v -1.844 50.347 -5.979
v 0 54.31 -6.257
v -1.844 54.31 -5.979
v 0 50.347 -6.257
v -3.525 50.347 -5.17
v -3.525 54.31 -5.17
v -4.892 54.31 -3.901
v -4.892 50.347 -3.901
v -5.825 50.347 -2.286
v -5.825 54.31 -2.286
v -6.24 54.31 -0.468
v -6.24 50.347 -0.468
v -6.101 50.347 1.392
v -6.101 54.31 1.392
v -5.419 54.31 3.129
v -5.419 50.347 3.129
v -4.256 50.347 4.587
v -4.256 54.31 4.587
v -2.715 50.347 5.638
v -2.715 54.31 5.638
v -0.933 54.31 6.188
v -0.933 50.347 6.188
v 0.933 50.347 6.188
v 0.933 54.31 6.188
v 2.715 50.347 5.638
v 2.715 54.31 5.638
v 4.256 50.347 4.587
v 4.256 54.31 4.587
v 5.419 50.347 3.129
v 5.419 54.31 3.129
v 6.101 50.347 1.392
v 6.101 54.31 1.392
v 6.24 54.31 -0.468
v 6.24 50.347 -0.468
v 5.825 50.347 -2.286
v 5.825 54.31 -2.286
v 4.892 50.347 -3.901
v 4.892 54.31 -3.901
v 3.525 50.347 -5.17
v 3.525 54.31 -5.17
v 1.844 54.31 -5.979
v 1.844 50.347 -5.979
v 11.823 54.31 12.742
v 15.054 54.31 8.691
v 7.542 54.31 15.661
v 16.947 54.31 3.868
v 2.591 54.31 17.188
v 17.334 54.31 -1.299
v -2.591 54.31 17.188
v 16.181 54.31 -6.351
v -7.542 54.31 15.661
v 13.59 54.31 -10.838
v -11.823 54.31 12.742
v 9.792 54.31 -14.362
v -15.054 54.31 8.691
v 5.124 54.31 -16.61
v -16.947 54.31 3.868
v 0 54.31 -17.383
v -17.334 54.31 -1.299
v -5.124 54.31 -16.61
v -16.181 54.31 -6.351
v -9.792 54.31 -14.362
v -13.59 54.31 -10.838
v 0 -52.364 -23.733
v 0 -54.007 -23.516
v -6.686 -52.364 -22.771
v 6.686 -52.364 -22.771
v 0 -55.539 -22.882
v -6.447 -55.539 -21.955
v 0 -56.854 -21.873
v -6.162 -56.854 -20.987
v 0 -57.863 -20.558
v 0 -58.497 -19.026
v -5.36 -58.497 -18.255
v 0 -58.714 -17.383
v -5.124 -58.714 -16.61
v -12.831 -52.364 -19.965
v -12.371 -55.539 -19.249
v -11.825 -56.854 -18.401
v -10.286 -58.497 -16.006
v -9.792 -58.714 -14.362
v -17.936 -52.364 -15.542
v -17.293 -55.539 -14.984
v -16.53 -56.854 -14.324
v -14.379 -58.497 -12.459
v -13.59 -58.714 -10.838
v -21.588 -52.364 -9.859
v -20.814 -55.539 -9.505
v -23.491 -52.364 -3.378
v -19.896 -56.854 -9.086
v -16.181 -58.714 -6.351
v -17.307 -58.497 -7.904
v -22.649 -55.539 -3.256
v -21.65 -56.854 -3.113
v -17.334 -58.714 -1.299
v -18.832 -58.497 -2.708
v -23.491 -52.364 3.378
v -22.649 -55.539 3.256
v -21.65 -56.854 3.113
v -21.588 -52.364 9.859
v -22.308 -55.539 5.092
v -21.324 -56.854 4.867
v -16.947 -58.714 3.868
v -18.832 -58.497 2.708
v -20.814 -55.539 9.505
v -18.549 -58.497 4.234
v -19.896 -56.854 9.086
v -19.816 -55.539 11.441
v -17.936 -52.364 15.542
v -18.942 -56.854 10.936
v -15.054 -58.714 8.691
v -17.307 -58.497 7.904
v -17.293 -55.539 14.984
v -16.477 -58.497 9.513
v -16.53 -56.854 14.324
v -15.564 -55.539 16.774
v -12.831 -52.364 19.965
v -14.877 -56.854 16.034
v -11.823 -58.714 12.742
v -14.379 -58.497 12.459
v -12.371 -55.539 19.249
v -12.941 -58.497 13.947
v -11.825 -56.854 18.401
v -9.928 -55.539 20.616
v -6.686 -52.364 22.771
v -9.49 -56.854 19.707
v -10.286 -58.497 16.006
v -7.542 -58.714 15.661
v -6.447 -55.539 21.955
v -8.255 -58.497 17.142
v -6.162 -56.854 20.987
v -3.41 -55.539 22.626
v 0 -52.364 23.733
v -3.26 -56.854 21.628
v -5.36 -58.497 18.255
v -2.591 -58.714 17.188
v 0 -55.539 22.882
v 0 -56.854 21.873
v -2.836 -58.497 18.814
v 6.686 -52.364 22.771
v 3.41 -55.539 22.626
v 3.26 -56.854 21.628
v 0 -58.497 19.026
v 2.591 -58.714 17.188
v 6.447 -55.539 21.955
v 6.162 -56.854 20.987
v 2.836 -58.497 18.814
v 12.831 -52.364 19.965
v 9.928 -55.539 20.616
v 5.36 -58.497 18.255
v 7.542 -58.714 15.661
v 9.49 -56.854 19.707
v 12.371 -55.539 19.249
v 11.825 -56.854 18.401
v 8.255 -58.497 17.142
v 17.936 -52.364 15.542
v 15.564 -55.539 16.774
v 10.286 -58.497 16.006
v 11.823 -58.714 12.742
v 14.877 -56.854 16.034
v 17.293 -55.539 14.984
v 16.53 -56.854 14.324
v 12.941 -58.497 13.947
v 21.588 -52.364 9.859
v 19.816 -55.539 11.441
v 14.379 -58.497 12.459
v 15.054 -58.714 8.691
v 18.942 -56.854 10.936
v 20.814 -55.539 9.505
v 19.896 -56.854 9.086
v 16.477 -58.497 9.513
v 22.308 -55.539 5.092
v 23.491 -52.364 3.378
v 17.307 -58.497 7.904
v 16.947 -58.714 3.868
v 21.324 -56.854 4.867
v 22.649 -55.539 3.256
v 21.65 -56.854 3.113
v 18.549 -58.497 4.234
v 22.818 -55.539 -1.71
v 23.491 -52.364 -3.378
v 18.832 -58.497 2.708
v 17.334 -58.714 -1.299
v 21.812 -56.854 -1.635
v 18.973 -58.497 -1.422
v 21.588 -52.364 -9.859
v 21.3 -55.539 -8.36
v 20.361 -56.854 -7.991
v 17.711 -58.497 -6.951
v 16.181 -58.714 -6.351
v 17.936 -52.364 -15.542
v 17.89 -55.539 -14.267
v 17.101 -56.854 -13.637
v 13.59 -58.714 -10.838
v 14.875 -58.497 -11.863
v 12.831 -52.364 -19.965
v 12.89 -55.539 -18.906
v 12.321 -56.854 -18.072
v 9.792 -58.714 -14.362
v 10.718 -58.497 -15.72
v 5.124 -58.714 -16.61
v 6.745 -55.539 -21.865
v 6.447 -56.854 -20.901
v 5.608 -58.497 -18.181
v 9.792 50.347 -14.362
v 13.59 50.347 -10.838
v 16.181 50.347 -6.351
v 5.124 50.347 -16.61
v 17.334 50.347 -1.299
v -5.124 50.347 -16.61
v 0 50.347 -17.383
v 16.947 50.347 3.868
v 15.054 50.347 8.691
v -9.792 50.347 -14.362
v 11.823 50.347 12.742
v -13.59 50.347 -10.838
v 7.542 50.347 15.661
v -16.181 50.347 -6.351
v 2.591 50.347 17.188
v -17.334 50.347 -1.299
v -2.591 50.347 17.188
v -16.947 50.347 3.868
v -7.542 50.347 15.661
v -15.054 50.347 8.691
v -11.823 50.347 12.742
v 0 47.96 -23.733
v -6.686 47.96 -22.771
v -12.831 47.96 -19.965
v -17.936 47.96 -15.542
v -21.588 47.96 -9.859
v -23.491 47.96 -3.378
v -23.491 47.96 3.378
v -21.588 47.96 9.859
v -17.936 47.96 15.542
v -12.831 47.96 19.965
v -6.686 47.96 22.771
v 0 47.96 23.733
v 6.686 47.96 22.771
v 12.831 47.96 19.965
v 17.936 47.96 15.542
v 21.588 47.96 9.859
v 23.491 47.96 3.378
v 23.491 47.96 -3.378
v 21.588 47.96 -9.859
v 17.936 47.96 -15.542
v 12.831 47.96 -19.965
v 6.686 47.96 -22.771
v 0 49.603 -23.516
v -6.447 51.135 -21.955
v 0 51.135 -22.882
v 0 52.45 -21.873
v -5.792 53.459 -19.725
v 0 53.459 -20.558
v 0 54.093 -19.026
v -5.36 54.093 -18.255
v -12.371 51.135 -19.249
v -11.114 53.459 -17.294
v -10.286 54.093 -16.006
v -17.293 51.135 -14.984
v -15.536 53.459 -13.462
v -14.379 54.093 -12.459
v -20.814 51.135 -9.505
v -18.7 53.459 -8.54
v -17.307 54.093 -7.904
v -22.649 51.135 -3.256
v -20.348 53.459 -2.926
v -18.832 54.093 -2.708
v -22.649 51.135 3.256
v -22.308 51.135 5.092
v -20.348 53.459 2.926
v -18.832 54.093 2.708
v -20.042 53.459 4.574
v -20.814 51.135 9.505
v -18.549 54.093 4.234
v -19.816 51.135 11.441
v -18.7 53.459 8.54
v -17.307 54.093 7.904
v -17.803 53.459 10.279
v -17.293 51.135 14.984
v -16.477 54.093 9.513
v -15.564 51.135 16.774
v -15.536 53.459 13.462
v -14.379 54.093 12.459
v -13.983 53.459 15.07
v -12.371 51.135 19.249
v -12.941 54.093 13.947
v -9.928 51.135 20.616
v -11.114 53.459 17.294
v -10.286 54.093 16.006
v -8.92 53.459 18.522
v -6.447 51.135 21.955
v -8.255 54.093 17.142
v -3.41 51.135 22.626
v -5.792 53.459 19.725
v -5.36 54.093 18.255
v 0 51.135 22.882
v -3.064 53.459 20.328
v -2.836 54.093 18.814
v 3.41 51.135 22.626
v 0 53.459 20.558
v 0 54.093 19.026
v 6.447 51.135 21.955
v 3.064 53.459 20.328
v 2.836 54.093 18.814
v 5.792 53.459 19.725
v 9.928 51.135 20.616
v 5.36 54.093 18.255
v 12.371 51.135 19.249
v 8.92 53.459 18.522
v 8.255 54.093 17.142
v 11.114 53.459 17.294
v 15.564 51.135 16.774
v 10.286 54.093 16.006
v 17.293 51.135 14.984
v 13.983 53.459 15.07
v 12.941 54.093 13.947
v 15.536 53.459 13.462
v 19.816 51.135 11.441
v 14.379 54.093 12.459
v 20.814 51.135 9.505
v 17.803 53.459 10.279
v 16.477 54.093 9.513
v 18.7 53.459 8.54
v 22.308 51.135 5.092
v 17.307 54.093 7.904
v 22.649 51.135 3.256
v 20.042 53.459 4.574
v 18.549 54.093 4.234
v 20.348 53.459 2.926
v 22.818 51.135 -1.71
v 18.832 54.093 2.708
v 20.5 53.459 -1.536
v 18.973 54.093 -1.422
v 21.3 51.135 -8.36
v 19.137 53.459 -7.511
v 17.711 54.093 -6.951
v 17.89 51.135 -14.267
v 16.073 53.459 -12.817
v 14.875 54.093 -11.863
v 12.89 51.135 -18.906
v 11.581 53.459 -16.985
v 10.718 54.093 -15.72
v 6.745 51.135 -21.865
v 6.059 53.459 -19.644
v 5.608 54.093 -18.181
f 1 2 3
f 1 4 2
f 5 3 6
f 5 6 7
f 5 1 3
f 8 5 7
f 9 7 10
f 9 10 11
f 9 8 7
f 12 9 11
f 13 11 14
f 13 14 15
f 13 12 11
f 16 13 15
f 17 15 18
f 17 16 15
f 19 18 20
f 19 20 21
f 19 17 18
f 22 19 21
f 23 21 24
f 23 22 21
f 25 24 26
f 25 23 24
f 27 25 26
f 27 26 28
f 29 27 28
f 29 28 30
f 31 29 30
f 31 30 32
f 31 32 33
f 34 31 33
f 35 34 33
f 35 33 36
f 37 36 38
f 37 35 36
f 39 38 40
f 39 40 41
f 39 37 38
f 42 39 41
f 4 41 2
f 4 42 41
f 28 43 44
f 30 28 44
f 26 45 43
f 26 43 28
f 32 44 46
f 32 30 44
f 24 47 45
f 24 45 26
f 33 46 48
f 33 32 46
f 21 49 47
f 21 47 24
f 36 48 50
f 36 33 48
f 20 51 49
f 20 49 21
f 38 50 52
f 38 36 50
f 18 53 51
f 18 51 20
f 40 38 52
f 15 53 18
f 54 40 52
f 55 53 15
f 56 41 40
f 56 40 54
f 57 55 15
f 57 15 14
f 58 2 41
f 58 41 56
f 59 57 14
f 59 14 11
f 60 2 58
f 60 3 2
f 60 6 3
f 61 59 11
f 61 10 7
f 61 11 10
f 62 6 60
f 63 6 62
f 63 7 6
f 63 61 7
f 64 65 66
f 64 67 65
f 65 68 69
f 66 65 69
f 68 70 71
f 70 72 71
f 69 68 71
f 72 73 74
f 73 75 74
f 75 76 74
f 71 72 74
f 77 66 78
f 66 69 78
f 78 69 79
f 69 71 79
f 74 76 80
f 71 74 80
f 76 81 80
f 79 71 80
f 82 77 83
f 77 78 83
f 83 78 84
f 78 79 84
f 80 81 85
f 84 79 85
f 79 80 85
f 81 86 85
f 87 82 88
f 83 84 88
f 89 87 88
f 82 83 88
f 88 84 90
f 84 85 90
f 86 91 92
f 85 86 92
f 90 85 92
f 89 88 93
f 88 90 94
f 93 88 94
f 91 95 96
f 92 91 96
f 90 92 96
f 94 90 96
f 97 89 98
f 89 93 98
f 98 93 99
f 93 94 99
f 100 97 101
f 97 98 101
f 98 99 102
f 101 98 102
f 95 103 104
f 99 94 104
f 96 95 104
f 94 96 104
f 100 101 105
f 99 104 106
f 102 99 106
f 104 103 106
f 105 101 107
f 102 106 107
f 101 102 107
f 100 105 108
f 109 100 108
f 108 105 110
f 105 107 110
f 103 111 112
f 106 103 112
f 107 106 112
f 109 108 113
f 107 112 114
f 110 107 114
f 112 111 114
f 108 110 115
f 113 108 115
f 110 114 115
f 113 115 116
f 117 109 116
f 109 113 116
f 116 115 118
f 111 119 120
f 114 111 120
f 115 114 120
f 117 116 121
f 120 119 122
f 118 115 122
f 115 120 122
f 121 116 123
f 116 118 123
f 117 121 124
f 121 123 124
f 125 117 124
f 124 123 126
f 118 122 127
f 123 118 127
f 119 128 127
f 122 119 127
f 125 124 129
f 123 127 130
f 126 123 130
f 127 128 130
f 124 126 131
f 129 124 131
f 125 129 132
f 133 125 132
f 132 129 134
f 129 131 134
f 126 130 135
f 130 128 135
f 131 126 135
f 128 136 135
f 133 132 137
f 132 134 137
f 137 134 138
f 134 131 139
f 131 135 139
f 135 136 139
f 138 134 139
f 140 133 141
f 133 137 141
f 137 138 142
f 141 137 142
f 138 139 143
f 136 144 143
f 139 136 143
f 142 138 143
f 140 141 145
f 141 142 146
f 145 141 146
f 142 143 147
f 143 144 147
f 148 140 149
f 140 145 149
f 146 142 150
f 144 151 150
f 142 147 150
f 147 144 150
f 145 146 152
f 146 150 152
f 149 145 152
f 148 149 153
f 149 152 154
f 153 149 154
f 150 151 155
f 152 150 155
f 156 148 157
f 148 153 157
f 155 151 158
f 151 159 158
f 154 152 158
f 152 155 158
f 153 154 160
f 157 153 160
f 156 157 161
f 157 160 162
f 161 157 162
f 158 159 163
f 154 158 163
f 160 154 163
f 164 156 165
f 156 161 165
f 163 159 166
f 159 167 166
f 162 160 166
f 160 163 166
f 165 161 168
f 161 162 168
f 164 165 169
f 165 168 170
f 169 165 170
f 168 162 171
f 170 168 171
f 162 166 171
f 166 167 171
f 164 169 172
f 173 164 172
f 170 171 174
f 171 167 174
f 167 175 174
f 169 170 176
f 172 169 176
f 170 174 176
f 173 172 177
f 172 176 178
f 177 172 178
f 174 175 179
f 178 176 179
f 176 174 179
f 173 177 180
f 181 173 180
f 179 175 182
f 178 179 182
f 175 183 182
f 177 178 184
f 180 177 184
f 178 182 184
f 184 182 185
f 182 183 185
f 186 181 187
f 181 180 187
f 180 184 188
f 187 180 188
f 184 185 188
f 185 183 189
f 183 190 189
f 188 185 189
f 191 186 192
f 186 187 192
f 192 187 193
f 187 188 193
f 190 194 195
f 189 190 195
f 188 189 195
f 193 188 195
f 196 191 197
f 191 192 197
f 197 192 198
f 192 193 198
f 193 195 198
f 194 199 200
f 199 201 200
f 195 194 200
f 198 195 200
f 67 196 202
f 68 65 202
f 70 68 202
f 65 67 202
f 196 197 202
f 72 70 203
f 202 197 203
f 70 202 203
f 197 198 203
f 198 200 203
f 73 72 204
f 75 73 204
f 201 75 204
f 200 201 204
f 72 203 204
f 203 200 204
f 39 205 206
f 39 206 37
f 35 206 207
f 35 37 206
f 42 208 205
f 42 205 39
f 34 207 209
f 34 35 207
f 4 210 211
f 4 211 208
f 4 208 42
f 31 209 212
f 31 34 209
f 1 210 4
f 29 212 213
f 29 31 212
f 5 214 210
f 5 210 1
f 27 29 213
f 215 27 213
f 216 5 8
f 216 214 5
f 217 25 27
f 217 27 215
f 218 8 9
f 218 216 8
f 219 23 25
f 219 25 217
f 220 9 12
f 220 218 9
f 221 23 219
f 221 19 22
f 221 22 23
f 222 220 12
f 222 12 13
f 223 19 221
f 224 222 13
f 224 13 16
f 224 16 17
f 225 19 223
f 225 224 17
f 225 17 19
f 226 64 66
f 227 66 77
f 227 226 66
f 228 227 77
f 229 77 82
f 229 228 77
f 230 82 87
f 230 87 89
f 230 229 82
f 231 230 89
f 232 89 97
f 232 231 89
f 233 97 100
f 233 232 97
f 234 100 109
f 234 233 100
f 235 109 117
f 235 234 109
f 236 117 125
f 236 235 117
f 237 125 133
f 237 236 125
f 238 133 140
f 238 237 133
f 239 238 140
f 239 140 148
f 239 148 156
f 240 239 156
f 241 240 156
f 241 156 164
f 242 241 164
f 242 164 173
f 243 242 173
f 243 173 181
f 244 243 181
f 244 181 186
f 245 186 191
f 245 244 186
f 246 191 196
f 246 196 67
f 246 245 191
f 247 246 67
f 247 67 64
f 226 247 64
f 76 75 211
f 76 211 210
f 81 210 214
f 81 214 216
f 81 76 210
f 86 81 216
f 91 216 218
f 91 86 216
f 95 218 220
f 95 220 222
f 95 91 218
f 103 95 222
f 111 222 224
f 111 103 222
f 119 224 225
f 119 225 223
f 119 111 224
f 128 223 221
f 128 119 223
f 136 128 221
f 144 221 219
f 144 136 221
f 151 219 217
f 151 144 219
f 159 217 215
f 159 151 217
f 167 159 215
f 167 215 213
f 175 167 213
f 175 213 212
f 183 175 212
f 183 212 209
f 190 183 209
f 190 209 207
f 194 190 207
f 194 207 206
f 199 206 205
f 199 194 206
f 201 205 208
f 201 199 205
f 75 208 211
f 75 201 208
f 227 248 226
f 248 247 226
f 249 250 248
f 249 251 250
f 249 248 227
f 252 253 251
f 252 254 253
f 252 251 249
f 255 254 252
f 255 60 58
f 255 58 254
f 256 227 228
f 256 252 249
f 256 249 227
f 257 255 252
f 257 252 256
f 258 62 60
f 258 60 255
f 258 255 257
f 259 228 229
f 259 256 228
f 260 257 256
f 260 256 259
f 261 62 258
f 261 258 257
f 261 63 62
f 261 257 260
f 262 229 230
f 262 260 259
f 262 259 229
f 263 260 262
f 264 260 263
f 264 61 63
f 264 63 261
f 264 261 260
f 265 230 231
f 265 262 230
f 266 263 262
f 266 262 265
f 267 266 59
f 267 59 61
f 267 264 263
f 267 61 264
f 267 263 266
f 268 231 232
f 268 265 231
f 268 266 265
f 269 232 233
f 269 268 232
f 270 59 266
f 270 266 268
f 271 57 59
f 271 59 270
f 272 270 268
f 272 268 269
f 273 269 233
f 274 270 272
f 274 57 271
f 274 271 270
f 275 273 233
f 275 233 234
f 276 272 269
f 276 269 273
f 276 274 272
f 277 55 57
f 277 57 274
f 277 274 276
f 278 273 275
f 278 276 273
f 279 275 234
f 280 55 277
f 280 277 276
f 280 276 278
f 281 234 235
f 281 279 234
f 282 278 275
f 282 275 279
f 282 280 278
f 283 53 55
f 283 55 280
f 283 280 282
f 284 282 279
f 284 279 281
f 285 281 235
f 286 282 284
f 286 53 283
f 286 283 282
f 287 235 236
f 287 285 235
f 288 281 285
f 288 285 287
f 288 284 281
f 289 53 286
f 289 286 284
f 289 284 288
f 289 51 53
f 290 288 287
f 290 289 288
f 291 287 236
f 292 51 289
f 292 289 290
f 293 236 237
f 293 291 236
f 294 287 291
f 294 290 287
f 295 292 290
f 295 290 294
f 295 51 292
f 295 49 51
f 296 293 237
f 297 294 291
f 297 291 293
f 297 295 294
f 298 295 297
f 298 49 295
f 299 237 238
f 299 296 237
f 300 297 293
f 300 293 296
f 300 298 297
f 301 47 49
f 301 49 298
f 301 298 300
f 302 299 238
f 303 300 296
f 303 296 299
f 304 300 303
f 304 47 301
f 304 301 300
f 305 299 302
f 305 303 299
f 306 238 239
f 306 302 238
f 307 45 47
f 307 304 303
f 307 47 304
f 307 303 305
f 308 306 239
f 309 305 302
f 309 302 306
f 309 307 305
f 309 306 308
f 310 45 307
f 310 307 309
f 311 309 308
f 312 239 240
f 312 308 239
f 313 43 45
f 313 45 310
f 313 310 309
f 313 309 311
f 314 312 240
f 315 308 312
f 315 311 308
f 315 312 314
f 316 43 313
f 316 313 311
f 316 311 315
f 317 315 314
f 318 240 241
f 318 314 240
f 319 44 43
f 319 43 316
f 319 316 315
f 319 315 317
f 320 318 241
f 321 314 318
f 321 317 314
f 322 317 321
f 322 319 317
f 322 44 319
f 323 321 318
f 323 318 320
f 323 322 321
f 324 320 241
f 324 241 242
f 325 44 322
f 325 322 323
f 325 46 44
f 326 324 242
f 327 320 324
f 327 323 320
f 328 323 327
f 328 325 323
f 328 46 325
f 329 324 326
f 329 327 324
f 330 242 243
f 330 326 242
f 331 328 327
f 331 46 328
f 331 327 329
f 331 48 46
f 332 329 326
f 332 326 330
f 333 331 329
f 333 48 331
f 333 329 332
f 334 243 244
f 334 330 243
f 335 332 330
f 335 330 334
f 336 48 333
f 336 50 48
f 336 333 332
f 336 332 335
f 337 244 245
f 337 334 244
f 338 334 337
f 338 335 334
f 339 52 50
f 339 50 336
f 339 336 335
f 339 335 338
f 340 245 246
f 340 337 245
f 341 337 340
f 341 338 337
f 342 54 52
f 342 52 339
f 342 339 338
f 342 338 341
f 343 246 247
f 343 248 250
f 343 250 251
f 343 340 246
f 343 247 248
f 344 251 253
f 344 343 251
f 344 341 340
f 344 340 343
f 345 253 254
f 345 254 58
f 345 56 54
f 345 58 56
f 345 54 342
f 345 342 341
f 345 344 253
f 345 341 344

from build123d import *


# Not quite as in the source:
# - a fillet or chamfer that OpenCascade refuses, or shapes differently, is made with other operations: its cross-section is extruded or revolved along the edge and cut away or added


with BuildPart() as f1:
    # F0 (on Right) → F1 (revolve)
    with BuildSketch(Plane.YZ):
        Polygon((-59.2030874318, -23.7326024727), (54.3095125682, -23.7326024727), (54.3095125682, -6.2574024727), (50.3471125682, -6.2574024727), (50.3471125682, -17.3826024727), (-58.7138126601, -17.3826024727), align=None)
    revolve(axis=Axis((0, 27.4040363729, 0), (0, 1, 0)))

    # F2: fillet of radius 6.35 on 2 edges, made by hand

    # F2_s1 → F2_t2 (revolve, cut)
    with BuildSketch(Plane.YZ):
        with BuildLine():
            ThreePointArc((-52.3638126601, -23.7326024727), (-56.8539407206, -21.8727305333), (-58.7138126601, -17.3826024727))
            Line((-58.7138126601, -17.3826024727), (-58.8408126601, -17.3826024727))
            ThreePointArc((-58.8408126601, -17.3826024727), (-59.0850747245, -20.5478458962), (-59.3297121104, -23.7228458962))
            Line((-59.3297121104, -23.7228458962), (-59.2030874318, -23.8596024727))
            Line((-59.2030874318, -23.8596024727), (-52.3638126601, -23.8596024727))
            Line((-52.3638126601, -23.8596024727), (-52.3638126601, -23.7326024727))
        make_face()
    revolve(axis=Axis((0, -59.2030874318, 0), (0, 1, 0)), mode=Mode.SUBTRACT)

    # F2_s3 → F2_t4 (revolve, cut)
    with BuildSketch(Plane.YZ):
        with BuildLine():
            ThreePointArc((47.9595125682, -23.7326024727), (52.4496406287, -21.8727305333), (54.3095125682, -17.3826024727))
            Line((54.3095125682, -17.3826024727), (54.4365125682, -17.3826024727))
            Line((54.4365125682, -17.3826024727), (54.4365125682, -23.8596024727))
            Line((54.4365125682, -23.8596024727), (47.9595125682, -23.8596024727))
            Line((47.9595125682, -23.8596024727), (47.9595125682, -23.7326024727))
        make_face()
    revolve(axis=Axis((0, 54.3095125682, 0), (0, 1, 0)), mode=Mode.SUBTRACT)


solid = f1.part
